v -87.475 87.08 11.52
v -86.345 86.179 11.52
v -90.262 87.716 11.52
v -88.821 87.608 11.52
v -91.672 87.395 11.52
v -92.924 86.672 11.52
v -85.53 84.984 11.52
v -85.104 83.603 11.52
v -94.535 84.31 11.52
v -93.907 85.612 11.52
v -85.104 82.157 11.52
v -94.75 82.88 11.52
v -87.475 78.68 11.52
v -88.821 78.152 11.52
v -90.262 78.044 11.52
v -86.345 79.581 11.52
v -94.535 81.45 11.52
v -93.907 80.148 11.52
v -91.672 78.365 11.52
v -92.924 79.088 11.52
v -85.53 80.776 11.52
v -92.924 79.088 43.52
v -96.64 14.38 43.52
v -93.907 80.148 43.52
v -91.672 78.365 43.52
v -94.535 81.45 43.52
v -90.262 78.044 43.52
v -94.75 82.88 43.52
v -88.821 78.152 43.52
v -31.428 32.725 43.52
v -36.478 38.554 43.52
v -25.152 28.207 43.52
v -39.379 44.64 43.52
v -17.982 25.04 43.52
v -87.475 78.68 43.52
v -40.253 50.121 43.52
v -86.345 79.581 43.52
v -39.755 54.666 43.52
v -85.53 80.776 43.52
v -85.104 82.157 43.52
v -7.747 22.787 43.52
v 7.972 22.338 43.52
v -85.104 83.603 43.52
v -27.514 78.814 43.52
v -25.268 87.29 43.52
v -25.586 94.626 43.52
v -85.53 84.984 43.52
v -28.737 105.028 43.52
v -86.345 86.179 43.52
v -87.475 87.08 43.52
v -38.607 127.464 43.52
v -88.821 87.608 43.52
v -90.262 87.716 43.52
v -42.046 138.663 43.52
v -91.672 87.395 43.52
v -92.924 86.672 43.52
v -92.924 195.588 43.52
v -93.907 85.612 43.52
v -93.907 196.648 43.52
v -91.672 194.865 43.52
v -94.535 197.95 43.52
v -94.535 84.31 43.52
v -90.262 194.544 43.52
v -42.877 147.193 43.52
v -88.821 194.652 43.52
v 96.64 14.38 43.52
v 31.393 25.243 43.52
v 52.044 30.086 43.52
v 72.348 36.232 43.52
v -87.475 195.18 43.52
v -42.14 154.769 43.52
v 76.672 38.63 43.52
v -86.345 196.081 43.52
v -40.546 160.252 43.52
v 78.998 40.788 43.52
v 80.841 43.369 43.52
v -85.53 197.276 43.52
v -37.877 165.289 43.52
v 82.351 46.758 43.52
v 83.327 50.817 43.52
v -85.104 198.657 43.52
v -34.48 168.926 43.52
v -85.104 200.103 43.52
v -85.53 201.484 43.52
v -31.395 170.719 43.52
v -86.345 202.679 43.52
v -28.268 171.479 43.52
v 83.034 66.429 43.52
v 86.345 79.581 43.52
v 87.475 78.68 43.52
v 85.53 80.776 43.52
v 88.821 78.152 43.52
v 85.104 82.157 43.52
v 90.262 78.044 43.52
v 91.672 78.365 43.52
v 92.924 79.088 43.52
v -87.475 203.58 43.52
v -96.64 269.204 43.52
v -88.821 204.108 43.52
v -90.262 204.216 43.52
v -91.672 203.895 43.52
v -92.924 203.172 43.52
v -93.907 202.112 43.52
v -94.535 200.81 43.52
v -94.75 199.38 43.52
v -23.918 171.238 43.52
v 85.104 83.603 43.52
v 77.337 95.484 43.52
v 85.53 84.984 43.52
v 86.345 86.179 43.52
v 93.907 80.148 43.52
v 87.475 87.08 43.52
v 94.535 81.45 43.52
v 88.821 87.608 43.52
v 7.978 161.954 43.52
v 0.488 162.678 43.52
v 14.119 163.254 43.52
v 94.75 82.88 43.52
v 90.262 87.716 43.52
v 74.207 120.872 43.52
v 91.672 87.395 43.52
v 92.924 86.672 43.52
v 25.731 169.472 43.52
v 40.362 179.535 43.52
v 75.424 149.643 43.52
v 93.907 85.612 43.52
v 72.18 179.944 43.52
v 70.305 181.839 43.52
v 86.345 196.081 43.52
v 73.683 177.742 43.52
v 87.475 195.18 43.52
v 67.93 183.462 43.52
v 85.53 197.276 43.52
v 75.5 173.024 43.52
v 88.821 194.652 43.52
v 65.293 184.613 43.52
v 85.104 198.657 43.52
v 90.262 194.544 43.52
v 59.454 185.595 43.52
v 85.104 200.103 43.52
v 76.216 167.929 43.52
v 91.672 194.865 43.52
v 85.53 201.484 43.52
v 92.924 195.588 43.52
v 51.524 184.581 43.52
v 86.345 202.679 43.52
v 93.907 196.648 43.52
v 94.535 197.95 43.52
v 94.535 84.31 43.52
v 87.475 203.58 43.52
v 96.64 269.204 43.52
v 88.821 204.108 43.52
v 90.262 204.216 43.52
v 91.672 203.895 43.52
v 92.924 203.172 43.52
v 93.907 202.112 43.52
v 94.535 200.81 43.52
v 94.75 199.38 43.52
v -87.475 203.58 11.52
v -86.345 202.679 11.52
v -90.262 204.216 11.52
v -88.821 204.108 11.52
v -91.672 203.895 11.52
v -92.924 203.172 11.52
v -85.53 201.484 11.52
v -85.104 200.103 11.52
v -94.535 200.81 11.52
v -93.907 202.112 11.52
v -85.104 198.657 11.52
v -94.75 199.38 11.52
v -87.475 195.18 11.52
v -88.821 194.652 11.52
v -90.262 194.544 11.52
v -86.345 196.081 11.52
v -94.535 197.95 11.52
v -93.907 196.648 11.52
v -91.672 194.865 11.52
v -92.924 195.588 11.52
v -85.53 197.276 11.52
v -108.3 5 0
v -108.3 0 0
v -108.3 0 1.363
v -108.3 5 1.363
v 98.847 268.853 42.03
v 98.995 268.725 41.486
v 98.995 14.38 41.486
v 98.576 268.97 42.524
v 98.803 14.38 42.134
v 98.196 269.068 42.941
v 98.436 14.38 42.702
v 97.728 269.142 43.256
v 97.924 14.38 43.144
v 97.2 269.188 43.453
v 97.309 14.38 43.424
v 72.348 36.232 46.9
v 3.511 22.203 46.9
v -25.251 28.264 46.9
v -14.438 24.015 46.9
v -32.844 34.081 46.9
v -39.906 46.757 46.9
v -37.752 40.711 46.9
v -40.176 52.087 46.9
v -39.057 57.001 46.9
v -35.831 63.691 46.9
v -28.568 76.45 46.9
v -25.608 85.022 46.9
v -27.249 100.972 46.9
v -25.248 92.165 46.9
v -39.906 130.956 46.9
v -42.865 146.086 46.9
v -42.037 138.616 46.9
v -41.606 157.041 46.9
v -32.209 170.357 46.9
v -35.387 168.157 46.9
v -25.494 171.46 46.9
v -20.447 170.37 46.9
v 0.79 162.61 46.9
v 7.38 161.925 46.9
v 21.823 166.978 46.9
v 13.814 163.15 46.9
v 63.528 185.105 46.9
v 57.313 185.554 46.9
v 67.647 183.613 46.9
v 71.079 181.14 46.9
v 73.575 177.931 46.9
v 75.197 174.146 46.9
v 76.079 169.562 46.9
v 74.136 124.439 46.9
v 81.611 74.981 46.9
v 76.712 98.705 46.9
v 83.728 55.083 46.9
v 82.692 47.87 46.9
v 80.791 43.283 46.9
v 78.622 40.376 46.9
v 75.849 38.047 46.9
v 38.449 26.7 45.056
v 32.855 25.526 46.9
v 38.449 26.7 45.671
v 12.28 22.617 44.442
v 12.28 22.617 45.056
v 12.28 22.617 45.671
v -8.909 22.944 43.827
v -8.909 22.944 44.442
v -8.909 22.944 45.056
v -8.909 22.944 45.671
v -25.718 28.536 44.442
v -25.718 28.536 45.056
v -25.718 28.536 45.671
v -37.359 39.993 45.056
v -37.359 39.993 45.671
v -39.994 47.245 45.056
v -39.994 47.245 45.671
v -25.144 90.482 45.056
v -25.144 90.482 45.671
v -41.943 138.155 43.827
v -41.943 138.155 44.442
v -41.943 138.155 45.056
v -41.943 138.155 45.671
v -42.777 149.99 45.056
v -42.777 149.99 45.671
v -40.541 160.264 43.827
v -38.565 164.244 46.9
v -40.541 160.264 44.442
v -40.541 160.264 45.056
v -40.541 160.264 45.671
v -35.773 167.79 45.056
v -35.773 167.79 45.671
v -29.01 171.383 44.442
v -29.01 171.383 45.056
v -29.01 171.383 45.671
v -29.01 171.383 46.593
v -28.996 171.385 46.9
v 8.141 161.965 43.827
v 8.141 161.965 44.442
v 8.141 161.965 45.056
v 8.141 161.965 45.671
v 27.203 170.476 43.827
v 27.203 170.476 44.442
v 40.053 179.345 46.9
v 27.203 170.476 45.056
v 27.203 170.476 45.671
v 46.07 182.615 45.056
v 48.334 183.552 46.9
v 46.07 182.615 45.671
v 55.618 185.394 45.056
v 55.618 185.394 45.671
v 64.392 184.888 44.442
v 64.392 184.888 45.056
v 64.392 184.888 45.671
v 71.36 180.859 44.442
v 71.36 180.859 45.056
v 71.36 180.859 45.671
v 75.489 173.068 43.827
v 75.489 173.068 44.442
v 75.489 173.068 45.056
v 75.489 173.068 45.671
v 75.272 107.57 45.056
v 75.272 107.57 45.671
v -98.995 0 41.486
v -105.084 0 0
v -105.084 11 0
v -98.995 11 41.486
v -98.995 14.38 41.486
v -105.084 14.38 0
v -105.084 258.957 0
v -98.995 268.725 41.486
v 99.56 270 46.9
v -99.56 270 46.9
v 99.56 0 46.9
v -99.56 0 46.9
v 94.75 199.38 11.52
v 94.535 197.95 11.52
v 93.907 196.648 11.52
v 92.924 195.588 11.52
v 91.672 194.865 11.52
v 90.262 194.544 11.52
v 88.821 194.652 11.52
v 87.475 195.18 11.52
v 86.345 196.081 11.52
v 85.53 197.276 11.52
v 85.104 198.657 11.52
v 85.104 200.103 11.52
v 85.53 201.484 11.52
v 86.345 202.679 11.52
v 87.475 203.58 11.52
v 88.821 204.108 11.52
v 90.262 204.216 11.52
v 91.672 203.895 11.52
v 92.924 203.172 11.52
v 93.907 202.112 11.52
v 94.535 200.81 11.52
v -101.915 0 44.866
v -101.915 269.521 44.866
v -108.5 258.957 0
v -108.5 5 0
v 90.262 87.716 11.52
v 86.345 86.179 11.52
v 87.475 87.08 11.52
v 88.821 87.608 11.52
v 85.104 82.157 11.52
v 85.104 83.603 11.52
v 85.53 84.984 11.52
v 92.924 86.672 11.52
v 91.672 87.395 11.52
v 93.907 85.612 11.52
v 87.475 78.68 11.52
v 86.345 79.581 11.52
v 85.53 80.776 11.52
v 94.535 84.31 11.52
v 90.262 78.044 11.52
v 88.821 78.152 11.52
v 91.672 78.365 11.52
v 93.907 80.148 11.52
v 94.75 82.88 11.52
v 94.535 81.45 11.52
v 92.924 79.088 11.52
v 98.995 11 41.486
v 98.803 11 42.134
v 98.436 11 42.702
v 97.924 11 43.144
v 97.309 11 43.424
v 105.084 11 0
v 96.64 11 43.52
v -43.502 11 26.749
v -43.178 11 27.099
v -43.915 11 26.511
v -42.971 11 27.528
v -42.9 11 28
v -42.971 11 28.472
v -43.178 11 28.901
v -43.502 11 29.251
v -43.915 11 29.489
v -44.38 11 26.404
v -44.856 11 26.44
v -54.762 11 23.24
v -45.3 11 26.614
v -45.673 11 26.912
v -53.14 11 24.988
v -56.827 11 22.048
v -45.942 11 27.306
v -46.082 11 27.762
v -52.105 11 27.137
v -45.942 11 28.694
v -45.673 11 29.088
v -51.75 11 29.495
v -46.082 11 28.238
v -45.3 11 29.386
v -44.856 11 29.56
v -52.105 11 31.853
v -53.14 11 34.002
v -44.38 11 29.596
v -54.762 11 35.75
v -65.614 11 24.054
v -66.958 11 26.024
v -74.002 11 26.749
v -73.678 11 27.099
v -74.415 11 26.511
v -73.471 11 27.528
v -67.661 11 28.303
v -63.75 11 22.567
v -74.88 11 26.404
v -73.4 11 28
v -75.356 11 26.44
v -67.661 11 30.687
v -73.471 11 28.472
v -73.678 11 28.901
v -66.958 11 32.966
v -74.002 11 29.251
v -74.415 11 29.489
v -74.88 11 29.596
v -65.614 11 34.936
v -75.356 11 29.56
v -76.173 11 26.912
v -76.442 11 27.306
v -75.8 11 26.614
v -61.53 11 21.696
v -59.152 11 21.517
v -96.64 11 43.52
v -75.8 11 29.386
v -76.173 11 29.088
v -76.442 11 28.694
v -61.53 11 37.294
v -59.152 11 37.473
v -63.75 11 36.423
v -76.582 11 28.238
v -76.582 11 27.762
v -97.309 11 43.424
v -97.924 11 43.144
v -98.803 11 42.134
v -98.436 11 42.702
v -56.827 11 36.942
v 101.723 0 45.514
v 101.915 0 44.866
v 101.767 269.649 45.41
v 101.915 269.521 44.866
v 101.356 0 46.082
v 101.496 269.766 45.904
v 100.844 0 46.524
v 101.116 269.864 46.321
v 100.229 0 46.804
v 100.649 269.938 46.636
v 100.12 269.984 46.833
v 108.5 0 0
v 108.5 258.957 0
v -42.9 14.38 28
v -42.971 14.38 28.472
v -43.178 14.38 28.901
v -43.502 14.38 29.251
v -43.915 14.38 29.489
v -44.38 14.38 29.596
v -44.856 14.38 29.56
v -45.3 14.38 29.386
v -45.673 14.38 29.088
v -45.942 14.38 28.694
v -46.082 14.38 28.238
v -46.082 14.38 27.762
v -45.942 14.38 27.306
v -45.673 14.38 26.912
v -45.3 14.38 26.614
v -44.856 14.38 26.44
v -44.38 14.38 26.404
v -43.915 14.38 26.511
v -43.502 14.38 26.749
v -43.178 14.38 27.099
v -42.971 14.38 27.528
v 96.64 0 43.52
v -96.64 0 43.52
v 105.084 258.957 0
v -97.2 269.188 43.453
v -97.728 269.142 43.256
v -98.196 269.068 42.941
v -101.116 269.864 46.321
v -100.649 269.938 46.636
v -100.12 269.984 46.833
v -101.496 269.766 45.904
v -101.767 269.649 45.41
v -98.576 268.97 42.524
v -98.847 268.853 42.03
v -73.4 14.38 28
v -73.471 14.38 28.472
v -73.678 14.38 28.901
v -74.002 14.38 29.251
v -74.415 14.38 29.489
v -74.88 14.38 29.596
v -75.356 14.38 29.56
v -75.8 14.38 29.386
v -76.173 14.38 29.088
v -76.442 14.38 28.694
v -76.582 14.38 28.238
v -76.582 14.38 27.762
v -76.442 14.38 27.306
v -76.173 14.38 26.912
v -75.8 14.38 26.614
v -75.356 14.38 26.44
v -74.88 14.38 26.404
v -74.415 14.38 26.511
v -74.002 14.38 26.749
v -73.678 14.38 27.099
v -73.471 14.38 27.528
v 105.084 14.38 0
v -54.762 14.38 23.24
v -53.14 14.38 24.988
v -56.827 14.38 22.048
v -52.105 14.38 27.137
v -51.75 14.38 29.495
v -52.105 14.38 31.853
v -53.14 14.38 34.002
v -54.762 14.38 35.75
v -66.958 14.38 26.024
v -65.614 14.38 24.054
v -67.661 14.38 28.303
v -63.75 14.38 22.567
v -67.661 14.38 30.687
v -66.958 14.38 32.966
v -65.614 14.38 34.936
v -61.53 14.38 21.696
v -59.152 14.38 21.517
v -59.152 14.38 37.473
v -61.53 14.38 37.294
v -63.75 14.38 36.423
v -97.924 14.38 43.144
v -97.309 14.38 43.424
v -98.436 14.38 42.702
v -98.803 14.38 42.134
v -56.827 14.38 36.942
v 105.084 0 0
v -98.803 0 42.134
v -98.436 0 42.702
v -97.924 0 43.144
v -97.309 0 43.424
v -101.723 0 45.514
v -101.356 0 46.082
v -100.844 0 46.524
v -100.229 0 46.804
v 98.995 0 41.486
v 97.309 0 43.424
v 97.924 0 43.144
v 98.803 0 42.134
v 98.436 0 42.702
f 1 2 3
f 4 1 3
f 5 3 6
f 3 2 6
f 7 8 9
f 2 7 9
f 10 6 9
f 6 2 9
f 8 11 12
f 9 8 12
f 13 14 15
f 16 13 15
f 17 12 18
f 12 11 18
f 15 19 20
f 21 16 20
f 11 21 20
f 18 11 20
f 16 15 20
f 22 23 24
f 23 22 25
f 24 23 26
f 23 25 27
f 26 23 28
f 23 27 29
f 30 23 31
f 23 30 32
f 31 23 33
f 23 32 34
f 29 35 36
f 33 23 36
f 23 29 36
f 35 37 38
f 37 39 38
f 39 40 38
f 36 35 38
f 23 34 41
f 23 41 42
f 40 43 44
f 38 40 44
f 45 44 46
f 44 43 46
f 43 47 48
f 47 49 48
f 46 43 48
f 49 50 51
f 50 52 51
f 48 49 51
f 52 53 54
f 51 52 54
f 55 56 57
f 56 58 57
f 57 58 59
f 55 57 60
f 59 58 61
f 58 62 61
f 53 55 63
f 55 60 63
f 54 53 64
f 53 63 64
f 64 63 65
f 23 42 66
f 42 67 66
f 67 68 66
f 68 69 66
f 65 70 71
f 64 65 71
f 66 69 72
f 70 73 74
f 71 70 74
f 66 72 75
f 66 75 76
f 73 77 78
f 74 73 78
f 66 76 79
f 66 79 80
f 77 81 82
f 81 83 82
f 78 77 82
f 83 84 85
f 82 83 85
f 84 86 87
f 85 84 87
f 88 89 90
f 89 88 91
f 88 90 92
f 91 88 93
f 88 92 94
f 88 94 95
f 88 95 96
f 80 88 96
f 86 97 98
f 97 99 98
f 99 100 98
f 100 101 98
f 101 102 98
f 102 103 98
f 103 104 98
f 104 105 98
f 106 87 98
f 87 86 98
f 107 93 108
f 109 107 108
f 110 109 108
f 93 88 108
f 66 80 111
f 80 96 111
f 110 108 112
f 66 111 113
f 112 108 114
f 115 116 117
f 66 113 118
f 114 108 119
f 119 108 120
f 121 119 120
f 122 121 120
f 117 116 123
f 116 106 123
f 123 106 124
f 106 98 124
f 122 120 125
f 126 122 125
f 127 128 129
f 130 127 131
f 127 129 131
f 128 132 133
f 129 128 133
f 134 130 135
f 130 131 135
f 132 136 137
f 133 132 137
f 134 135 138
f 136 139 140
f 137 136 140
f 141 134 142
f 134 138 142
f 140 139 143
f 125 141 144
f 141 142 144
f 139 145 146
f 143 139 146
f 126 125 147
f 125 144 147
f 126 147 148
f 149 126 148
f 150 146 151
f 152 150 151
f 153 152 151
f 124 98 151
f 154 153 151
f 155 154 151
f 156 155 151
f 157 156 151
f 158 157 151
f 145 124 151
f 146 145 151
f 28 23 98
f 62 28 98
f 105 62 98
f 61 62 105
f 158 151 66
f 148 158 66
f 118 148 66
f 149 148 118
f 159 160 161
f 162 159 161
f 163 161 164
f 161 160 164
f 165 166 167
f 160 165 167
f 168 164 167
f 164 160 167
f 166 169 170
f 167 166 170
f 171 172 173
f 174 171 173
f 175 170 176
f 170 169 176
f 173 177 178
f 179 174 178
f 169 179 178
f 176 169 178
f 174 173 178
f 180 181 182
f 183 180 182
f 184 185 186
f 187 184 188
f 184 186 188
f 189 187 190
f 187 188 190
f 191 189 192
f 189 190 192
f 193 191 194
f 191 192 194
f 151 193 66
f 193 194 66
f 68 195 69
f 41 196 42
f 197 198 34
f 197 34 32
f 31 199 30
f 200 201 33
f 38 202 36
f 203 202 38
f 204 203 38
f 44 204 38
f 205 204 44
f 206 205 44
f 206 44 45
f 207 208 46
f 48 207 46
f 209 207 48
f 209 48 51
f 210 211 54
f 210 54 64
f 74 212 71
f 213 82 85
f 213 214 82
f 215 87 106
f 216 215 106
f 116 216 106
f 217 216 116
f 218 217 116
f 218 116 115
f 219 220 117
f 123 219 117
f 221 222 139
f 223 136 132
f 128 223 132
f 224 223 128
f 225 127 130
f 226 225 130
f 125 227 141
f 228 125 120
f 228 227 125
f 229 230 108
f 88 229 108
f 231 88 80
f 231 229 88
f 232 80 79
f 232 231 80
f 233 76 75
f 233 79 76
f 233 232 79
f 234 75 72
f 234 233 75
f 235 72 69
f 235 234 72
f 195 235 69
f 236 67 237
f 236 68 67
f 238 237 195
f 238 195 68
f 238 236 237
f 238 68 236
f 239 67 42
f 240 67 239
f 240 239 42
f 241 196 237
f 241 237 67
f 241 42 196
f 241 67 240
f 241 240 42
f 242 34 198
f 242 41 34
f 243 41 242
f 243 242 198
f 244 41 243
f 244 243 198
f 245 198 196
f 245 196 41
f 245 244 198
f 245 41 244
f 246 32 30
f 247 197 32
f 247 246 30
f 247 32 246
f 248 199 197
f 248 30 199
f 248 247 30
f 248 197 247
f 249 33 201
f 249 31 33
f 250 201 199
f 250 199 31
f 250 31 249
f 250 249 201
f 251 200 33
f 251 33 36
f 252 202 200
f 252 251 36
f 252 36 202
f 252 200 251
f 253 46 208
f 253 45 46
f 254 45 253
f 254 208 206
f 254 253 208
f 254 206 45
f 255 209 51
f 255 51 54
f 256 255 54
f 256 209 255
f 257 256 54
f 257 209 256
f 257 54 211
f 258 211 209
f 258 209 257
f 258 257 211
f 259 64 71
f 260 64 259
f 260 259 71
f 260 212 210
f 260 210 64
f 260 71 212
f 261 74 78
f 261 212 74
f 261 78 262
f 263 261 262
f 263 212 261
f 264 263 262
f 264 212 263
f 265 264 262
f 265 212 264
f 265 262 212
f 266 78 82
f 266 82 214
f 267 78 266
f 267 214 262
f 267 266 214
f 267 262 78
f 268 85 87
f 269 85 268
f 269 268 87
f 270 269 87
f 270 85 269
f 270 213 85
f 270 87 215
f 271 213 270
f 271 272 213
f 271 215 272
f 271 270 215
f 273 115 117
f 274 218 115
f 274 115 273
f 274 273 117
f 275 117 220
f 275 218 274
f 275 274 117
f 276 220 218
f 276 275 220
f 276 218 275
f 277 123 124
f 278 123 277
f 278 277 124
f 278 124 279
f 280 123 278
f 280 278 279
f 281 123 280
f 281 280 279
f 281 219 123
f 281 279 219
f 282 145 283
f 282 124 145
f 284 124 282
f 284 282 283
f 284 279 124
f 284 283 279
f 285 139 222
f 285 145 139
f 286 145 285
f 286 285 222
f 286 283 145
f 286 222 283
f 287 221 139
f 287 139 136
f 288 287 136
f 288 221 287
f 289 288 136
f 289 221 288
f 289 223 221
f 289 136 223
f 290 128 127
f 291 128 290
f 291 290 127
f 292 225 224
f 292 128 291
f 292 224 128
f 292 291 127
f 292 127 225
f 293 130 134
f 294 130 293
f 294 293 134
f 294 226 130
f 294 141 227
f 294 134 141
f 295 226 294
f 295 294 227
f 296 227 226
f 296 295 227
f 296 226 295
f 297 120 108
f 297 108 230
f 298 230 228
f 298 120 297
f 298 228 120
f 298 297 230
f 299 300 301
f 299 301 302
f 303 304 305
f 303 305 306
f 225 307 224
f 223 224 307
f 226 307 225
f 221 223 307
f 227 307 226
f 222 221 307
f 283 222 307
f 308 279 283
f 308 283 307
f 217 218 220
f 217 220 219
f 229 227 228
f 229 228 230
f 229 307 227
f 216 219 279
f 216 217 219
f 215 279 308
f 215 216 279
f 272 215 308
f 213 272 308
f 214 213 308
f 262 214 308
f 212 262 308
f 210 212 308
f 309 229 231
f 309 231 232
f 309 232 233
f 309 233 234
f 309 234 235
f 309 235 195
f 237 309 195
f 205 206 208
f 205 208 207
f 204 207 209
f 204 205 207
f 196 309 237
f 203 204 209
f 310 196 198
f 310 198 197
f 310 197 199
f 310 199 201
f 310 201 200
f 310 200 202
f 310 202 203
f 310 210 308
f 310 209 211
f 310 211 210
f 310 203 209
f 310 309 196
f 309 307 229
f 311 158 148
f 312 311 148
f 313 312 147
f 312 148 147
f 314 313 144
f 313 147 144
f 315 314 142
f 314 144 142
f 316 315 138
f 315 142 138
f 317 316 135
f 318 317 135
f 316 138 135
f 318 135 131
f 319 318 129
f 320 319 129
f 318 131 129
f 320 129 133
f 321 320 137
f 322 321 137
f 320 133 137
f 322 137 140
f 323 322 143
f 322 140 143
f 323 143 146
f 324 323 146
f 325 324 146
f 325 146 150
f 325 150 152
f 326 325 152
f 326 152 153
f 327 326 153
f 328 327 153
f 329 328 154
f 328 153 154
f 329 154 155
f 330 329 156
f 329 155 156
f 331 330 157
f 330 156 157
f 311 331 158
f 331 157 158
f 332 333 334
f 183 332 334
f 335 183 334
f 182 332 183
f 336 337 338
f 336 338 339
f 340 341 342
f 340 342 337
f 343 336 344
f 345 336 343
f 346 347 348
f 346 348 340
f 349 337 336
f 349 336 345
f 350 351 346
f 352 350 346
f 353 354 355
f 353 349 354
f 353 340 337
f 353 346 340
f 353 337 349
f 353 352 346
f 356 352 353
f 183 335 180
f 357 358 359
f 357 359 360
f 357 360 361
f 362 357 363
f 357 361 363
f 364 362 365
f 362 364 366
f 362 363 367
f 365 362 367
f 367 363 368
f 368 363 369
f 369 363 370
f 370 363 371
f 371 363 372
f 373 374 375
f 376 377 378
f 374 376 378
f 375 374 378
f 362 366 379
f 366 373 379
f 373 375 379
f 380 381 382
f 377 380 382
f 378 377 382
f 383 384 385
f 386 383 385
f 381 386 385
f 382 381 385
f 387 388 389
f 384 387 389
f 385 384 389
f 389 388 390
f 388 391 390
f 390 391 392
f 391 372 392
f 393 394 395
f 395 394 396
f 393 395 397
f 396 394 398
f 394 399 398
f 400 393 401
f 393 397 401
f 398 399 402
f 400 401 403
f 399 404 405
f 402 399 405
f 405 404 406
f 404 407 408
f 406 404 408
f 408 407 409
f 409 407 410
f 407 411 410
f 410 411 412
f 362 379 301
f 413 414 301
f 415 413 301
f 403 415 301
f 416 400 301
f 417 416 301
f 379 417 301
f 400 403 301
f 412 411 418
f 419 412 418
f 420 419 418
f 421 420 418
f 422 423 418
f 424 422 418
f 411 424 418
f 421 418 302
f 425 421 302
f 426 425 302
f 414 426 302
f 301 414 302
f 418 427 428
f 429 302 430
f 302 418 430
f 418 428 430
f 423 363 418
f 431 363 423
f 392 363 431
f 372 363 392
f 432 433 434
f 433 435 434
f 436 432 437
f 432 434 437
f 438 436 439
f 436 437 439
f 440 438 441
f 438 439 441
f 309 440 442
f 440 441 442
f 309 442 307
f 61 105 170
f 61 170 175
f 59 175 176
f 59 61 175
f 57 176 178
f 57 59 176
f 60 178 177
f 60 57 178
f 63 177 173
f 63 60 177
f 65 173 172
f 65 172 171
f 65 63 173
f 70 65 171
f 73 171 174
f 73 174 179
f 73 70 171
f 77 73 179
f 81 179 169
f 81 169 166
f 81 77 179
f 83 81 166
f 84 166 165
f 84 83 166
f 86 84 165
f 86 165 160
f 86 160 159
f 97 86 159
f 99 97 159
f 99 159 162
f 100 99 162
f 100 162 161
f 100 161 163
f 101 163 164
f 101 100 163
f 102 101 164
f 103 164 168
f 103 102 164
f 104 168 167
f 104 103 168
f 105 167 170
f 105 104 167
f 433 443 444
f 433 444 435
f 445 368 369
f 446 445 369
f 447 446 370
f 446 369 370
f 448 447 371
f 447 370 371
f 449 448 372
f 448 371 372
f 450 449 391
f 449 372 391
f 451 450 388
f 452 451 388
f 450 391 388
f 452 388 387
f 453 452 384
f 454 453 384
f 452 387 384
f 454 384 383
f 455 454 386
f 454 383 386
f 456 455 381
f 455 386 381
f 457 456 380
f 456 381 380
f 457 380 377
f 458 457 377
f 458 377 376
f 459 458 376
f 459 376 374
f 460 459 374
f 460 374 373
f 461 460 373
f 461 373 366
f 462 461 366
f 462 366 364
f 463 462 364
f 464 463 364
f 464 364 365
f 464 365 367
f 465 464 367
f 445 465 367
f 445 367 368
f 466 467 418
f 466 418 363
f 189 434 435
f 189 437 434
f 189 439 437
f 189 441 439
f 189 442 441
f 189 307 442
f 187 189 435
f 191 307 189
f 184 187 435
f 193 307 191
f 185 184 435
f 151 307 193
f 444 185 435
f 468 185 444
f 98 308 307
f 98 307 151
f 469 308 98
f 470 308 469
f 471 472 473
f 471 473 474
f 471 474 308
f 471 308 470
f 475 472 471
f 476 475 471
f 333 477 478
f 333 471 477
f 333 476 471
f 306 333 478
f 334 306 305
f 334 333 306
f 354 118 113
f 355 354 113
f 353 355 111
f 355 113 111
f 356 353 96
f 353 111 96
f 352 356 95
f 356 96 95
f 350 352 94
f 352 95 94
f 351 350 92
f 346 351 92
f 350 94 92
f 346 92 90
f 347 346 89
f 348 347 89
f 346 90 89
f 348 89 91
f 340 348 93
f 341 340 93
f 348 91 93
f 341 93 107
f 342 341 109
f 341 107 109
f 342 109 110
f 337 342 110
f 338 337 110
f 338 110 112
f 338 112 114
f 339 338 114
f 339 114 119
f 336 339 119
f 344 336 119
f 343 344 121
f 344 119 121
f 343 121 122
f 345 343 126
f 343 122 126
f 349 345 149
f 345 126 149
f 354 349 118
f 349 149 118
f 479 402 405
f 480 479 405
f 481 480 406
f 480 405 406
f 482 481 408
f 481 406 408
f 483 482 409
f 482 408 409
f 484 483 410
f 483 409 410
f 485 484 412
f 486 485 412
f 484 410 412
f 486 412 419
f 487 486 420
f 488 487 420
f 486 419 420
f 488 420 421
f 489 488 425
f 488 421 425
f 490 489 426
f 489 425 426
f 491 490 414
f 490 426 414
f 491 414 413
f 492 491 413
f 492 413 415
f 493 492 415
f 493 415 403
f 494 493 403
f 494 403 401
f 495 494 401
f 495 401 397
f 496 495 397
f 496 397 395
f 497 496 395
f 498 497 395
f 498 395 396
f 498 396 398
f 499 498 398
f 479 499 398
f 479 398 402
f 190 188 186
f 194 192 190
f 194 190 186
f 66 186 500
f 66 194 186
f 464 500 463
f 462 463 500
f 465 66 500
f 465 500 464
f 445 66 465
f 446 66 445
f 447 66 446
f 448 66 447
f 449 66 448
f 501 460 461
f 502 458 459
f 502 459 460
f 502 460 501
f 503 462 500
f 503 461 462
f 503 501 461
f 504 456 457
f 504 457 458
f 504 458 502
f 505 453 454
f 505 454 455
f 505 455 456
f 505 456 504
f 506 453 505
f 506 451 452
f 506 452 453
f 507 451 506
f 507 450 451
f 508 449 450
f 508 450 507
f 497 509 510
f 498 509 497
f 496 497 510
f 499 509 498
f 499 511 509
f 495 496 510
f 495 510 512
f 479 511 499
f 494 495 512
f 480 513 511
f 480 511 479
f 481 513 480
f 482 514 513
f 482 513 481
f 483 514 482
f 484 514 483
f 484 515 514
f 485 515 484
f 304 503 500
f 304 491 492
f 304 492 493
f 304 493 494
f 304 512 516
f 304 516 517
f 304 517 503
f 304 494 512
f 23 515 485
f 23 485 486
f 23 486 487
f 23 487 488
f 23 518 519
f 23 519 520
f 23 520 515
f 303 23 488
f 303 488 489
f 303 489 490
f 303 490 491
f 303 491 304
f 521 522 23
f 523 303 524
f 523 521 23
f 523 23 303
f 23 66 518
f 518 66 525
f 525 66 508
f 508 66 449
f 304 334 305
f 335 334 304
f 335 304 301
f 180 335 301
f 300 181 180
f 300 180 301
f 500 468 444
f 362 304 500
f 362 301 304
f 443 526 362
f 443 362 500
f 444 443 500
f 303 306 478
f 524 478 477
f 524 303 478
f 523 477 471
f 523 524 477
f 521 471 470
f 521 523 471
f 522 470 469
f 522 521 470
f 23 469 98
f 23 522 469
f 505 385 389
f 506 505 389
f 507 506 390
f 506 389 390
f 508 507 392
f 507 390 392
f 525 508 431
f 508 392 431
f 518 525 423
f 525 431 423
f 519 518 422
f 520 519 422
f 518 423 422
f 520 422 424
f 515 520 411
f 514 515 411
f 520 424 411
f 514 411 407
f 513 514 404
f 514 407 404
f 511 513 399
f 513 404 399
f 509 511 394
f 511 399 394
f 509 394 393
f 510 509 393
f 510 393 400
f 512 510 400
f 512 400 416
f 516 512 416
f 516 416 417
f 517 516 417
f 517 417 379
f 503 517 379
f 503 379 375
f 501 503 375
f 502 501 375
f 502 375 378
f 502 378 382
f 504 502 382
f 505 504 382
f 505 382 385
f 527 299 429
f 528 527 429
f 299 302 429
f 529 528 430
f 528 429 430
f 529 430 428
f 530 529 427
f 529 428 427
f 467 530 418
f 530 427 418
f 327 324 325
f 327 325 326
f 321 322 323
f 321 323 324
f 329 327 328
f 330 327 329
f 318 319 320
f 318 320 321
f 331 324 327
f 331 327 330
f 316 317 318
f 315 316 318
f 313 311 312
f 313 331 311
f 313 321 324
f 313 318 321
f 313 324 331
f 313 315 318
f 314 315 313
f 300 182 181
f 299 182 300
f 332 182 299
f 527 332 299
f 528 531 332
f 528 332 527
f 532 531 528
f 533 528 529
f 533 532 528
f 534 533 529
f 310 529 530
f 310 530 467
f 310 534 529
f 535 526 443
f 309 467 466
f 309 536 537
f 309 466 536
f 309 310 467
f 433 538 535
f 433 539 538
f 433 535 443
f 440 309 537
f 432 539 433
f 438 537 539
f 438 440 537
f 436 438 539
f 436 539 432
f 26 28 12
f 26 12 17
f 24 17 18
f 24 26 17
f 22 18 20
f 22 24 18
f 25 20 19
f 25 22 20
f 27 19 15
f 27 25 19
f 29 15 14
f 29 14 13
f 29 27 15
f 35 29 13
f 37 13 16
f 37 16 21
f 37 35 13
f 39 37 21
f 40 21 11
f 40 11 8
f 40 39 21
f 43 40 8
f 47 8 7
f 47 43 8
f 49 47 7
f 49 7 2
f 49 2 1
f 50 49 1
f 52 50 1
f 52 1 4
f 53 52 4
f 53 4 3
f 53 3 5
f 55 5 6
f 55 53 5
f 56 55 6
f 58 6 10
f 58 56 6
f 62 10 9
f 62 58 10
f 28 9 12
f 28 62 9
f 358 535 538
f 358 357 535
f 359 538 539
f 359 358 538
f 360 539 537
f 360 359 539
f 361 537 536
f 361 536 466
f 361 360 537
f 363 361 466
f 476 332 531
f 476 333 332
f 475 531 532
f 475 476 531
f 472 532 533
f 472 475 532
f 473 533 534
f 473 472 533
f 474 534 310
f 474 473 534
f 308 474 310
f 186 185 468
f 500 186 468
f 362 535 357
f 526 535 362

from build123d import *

# Parameters (mm, degrees)
PAD_DEPTH           = 270
POCKET_DEPTH        = 108.501
POCKET_DEPTH_BACK   = 108.501
POCKET001_DEPTH     = 11
POCKET002_DEPTH     = 265.62
FILLET_R            = 2.38
SKETCH004_R         = 4.85
PAD001_DEPTH        = 32
SKETCH005_R         = 4.85
PAD002_DEPTH        = 32
SKETCH006_W         = 0.2
SKETCH006_H         = 2
POCKET003_DEPTH     = 5
SKETCH007_R         = 1.6
POCKET004_DEPTH     = 259.001
LINEARPATTERN_COUNT = 2
LINEARPATTERN_PITCH = 30.5
SKETCH008_R         = 8
POCKET005_DEPTH     = 259.001
POCKET006_DEPTH     = 46.901


with BuildPart() as part:
    # Sketch → Pad (new body)
    with BuildSketch(Plane.XZ):
        Polygon((-108.5, 0), (108.5, 0), (101.616226, 46.9), (-101.616226, 46.9), align=None)
    extrude(amount=-PAD_DEPTH)

    # Sketch001 → Pocket (cut, two sides)
    with BuildSketch(Plane.YZ) as pocket_sk:
        Polygon((270, 46.9), (258.956516, 0), (270, 0), align=None)
    extrude(amount=-POCKET_DEPTH, mode=Mode.SUBTRACT)
    extrude(pocket_sk.sketch, amount=POCKET_DEPTH_BACK, mode=Mode.SUBTRACT)

    # Sketch002 (on Face2 of Pocket) → Pocket001 (cut)
    with BuildSketch(Plane.XZ):
        Polygon((-105.083786, 0), (-98.696113, 43.52), (98.696113, 43.52), (105.083786, 0), align=None)
    extrude(amount=-POCKET001_DEPTH, mode=Mode.SUBTRACT)

    # Sketch003 (on DatumPlane) → Pocket002 (cut)
    with BuildSketch(Plane.XZ.offset(-280)):
        Polygon((-105.083786, 0), (-98.696113, 43.52), (98.696113, 43.52), (105.083786, 0), align=None)
    extrude(amount=POCKET002_DEPTH, mode=Mode.SUBTRACT)

    # Fillet
    fillet_edges = [part.edges().sort_by_distance(p)[0] for p in [
        (101.616226, 135, 46.9),
        (-101.616226, 135, 46.9),
        (-98.696113, 5.5, 43.52),
        (98.696113, 5.5, 43.52),
        (-98.696113, 141.792058, 43.52),
        (98.696113, 141.792058, 43.52),
    ]]
    fillet(fillet_edges, radius=FILLET_R)

    # Sketch004 (on Face19 of Fillet) → Pad001 (join)
    with BuildSketch(Plane(origin=(0, 0, 43.52), x_dir=(1, 0, 0), z_dir=(0, 0, -1))):
        with Locations((89.9, -82.88)):
            Circle(SKETCH004_R)
    pad001 = extrude(amount=PAD001_DEPTH)

    # Mirrored: Pad001 across YZ
    add(pad001.mirror(Plane.YZ))

    # Sketch005 (on Face19 of Mirrored) → Pad002 (join)
    with BuildSketch(Plane(origin=(0, 0, 43.52), x_dir=(1, 0, 0), z_dir=(0, 0, -1))):
        with Locations((89.9, -199.38)):
            Circle(SKETCH005_R)
    pad002 = extrude(amount=PAD002_DEPTH)

    # Mirrored001: Pad002 across YZ
    add(pad002.mirror(Plane.YZ))

    # Sketch006 (on Face1 of Mirrored001) → Pocket003 (cut)
    with BuildSketch(Plane.XZ):
        with Locations((-108.4, 1)):
            Rectangle(SKETCH006_W, SKETCH006_H)
    extrude(amount=-POCKET003_DEPTH, mode=Mode.SUBTRACT)

    # Sketch007 (on Face16 of Pocket003) → Pocket004 (cut, through all)
    with BuildSketch(Plane.XZ.offset(-11)):
        with Locations((-75, 28)):
            Circle(SKETCH007_R)
    pocket004 = extrude(amount=-POCKET004_DEPTH, mode=Mode.SUBTRACT)

    # LinearPattern: Pocket004 ×2
    with Locations(*[(i * LINEARPATTERN_PITCH, 0, 0) for i in range(1, LINEARPATTERN_COUNT)]):
        add(pocket004, mode=Mode.SUBTRACT)

    # Sketch008 (on Face16 of LinearPattern) → Pocket005 (cut, through all)
    with BuildSketch(Plane.XZ.offset(-11)):
        with Locations((-59.75, 29.495)):
            Circle(SKETCH008_R)
    extrude(amount=-POCKET005_DEPTH, mode=Mode.SUBTRACT)

    # Sketch009 (on Face4 of Pocket005) → Pocket006 (cut, through all)
    with BuildSketch(Plane(origin=(0, 0, 46.9), x_dir=(-1, 0, 0), z_dir=(0, 0, 1))):
        with BuildLine():
            add(Edge.make_bspline(
                [(-72.348312, -36.232048), (-46.441032, -27.725185), (-9.320162, -19.991676), (28.599676, -24.141003), (49.227497, -54.658081), (12.519243, -87.269521), (51.560257, -139.156158), (32.898109, -185.033951), (-9.091726, -149.005615), (-45.379246, -190.736267), (-85.813911, -183.737961), (-64.300598, -112.718109), (-93.84581, -44.779697), (-72.348312, -36.232048)],
                knots=[0, 0, 0, 0, 0.090909, 0.181818, 0.272727, 0.363636, 0.454545, 0.545455, 0.636364, 0.727273, 0.818182, 0.909091, 1, 1, 1, 1], degree=3))
        make_face()
    extrude(amount=-POCKET006_DEPTH, mode=Mode.SUBTRACT)


solid = part.part
